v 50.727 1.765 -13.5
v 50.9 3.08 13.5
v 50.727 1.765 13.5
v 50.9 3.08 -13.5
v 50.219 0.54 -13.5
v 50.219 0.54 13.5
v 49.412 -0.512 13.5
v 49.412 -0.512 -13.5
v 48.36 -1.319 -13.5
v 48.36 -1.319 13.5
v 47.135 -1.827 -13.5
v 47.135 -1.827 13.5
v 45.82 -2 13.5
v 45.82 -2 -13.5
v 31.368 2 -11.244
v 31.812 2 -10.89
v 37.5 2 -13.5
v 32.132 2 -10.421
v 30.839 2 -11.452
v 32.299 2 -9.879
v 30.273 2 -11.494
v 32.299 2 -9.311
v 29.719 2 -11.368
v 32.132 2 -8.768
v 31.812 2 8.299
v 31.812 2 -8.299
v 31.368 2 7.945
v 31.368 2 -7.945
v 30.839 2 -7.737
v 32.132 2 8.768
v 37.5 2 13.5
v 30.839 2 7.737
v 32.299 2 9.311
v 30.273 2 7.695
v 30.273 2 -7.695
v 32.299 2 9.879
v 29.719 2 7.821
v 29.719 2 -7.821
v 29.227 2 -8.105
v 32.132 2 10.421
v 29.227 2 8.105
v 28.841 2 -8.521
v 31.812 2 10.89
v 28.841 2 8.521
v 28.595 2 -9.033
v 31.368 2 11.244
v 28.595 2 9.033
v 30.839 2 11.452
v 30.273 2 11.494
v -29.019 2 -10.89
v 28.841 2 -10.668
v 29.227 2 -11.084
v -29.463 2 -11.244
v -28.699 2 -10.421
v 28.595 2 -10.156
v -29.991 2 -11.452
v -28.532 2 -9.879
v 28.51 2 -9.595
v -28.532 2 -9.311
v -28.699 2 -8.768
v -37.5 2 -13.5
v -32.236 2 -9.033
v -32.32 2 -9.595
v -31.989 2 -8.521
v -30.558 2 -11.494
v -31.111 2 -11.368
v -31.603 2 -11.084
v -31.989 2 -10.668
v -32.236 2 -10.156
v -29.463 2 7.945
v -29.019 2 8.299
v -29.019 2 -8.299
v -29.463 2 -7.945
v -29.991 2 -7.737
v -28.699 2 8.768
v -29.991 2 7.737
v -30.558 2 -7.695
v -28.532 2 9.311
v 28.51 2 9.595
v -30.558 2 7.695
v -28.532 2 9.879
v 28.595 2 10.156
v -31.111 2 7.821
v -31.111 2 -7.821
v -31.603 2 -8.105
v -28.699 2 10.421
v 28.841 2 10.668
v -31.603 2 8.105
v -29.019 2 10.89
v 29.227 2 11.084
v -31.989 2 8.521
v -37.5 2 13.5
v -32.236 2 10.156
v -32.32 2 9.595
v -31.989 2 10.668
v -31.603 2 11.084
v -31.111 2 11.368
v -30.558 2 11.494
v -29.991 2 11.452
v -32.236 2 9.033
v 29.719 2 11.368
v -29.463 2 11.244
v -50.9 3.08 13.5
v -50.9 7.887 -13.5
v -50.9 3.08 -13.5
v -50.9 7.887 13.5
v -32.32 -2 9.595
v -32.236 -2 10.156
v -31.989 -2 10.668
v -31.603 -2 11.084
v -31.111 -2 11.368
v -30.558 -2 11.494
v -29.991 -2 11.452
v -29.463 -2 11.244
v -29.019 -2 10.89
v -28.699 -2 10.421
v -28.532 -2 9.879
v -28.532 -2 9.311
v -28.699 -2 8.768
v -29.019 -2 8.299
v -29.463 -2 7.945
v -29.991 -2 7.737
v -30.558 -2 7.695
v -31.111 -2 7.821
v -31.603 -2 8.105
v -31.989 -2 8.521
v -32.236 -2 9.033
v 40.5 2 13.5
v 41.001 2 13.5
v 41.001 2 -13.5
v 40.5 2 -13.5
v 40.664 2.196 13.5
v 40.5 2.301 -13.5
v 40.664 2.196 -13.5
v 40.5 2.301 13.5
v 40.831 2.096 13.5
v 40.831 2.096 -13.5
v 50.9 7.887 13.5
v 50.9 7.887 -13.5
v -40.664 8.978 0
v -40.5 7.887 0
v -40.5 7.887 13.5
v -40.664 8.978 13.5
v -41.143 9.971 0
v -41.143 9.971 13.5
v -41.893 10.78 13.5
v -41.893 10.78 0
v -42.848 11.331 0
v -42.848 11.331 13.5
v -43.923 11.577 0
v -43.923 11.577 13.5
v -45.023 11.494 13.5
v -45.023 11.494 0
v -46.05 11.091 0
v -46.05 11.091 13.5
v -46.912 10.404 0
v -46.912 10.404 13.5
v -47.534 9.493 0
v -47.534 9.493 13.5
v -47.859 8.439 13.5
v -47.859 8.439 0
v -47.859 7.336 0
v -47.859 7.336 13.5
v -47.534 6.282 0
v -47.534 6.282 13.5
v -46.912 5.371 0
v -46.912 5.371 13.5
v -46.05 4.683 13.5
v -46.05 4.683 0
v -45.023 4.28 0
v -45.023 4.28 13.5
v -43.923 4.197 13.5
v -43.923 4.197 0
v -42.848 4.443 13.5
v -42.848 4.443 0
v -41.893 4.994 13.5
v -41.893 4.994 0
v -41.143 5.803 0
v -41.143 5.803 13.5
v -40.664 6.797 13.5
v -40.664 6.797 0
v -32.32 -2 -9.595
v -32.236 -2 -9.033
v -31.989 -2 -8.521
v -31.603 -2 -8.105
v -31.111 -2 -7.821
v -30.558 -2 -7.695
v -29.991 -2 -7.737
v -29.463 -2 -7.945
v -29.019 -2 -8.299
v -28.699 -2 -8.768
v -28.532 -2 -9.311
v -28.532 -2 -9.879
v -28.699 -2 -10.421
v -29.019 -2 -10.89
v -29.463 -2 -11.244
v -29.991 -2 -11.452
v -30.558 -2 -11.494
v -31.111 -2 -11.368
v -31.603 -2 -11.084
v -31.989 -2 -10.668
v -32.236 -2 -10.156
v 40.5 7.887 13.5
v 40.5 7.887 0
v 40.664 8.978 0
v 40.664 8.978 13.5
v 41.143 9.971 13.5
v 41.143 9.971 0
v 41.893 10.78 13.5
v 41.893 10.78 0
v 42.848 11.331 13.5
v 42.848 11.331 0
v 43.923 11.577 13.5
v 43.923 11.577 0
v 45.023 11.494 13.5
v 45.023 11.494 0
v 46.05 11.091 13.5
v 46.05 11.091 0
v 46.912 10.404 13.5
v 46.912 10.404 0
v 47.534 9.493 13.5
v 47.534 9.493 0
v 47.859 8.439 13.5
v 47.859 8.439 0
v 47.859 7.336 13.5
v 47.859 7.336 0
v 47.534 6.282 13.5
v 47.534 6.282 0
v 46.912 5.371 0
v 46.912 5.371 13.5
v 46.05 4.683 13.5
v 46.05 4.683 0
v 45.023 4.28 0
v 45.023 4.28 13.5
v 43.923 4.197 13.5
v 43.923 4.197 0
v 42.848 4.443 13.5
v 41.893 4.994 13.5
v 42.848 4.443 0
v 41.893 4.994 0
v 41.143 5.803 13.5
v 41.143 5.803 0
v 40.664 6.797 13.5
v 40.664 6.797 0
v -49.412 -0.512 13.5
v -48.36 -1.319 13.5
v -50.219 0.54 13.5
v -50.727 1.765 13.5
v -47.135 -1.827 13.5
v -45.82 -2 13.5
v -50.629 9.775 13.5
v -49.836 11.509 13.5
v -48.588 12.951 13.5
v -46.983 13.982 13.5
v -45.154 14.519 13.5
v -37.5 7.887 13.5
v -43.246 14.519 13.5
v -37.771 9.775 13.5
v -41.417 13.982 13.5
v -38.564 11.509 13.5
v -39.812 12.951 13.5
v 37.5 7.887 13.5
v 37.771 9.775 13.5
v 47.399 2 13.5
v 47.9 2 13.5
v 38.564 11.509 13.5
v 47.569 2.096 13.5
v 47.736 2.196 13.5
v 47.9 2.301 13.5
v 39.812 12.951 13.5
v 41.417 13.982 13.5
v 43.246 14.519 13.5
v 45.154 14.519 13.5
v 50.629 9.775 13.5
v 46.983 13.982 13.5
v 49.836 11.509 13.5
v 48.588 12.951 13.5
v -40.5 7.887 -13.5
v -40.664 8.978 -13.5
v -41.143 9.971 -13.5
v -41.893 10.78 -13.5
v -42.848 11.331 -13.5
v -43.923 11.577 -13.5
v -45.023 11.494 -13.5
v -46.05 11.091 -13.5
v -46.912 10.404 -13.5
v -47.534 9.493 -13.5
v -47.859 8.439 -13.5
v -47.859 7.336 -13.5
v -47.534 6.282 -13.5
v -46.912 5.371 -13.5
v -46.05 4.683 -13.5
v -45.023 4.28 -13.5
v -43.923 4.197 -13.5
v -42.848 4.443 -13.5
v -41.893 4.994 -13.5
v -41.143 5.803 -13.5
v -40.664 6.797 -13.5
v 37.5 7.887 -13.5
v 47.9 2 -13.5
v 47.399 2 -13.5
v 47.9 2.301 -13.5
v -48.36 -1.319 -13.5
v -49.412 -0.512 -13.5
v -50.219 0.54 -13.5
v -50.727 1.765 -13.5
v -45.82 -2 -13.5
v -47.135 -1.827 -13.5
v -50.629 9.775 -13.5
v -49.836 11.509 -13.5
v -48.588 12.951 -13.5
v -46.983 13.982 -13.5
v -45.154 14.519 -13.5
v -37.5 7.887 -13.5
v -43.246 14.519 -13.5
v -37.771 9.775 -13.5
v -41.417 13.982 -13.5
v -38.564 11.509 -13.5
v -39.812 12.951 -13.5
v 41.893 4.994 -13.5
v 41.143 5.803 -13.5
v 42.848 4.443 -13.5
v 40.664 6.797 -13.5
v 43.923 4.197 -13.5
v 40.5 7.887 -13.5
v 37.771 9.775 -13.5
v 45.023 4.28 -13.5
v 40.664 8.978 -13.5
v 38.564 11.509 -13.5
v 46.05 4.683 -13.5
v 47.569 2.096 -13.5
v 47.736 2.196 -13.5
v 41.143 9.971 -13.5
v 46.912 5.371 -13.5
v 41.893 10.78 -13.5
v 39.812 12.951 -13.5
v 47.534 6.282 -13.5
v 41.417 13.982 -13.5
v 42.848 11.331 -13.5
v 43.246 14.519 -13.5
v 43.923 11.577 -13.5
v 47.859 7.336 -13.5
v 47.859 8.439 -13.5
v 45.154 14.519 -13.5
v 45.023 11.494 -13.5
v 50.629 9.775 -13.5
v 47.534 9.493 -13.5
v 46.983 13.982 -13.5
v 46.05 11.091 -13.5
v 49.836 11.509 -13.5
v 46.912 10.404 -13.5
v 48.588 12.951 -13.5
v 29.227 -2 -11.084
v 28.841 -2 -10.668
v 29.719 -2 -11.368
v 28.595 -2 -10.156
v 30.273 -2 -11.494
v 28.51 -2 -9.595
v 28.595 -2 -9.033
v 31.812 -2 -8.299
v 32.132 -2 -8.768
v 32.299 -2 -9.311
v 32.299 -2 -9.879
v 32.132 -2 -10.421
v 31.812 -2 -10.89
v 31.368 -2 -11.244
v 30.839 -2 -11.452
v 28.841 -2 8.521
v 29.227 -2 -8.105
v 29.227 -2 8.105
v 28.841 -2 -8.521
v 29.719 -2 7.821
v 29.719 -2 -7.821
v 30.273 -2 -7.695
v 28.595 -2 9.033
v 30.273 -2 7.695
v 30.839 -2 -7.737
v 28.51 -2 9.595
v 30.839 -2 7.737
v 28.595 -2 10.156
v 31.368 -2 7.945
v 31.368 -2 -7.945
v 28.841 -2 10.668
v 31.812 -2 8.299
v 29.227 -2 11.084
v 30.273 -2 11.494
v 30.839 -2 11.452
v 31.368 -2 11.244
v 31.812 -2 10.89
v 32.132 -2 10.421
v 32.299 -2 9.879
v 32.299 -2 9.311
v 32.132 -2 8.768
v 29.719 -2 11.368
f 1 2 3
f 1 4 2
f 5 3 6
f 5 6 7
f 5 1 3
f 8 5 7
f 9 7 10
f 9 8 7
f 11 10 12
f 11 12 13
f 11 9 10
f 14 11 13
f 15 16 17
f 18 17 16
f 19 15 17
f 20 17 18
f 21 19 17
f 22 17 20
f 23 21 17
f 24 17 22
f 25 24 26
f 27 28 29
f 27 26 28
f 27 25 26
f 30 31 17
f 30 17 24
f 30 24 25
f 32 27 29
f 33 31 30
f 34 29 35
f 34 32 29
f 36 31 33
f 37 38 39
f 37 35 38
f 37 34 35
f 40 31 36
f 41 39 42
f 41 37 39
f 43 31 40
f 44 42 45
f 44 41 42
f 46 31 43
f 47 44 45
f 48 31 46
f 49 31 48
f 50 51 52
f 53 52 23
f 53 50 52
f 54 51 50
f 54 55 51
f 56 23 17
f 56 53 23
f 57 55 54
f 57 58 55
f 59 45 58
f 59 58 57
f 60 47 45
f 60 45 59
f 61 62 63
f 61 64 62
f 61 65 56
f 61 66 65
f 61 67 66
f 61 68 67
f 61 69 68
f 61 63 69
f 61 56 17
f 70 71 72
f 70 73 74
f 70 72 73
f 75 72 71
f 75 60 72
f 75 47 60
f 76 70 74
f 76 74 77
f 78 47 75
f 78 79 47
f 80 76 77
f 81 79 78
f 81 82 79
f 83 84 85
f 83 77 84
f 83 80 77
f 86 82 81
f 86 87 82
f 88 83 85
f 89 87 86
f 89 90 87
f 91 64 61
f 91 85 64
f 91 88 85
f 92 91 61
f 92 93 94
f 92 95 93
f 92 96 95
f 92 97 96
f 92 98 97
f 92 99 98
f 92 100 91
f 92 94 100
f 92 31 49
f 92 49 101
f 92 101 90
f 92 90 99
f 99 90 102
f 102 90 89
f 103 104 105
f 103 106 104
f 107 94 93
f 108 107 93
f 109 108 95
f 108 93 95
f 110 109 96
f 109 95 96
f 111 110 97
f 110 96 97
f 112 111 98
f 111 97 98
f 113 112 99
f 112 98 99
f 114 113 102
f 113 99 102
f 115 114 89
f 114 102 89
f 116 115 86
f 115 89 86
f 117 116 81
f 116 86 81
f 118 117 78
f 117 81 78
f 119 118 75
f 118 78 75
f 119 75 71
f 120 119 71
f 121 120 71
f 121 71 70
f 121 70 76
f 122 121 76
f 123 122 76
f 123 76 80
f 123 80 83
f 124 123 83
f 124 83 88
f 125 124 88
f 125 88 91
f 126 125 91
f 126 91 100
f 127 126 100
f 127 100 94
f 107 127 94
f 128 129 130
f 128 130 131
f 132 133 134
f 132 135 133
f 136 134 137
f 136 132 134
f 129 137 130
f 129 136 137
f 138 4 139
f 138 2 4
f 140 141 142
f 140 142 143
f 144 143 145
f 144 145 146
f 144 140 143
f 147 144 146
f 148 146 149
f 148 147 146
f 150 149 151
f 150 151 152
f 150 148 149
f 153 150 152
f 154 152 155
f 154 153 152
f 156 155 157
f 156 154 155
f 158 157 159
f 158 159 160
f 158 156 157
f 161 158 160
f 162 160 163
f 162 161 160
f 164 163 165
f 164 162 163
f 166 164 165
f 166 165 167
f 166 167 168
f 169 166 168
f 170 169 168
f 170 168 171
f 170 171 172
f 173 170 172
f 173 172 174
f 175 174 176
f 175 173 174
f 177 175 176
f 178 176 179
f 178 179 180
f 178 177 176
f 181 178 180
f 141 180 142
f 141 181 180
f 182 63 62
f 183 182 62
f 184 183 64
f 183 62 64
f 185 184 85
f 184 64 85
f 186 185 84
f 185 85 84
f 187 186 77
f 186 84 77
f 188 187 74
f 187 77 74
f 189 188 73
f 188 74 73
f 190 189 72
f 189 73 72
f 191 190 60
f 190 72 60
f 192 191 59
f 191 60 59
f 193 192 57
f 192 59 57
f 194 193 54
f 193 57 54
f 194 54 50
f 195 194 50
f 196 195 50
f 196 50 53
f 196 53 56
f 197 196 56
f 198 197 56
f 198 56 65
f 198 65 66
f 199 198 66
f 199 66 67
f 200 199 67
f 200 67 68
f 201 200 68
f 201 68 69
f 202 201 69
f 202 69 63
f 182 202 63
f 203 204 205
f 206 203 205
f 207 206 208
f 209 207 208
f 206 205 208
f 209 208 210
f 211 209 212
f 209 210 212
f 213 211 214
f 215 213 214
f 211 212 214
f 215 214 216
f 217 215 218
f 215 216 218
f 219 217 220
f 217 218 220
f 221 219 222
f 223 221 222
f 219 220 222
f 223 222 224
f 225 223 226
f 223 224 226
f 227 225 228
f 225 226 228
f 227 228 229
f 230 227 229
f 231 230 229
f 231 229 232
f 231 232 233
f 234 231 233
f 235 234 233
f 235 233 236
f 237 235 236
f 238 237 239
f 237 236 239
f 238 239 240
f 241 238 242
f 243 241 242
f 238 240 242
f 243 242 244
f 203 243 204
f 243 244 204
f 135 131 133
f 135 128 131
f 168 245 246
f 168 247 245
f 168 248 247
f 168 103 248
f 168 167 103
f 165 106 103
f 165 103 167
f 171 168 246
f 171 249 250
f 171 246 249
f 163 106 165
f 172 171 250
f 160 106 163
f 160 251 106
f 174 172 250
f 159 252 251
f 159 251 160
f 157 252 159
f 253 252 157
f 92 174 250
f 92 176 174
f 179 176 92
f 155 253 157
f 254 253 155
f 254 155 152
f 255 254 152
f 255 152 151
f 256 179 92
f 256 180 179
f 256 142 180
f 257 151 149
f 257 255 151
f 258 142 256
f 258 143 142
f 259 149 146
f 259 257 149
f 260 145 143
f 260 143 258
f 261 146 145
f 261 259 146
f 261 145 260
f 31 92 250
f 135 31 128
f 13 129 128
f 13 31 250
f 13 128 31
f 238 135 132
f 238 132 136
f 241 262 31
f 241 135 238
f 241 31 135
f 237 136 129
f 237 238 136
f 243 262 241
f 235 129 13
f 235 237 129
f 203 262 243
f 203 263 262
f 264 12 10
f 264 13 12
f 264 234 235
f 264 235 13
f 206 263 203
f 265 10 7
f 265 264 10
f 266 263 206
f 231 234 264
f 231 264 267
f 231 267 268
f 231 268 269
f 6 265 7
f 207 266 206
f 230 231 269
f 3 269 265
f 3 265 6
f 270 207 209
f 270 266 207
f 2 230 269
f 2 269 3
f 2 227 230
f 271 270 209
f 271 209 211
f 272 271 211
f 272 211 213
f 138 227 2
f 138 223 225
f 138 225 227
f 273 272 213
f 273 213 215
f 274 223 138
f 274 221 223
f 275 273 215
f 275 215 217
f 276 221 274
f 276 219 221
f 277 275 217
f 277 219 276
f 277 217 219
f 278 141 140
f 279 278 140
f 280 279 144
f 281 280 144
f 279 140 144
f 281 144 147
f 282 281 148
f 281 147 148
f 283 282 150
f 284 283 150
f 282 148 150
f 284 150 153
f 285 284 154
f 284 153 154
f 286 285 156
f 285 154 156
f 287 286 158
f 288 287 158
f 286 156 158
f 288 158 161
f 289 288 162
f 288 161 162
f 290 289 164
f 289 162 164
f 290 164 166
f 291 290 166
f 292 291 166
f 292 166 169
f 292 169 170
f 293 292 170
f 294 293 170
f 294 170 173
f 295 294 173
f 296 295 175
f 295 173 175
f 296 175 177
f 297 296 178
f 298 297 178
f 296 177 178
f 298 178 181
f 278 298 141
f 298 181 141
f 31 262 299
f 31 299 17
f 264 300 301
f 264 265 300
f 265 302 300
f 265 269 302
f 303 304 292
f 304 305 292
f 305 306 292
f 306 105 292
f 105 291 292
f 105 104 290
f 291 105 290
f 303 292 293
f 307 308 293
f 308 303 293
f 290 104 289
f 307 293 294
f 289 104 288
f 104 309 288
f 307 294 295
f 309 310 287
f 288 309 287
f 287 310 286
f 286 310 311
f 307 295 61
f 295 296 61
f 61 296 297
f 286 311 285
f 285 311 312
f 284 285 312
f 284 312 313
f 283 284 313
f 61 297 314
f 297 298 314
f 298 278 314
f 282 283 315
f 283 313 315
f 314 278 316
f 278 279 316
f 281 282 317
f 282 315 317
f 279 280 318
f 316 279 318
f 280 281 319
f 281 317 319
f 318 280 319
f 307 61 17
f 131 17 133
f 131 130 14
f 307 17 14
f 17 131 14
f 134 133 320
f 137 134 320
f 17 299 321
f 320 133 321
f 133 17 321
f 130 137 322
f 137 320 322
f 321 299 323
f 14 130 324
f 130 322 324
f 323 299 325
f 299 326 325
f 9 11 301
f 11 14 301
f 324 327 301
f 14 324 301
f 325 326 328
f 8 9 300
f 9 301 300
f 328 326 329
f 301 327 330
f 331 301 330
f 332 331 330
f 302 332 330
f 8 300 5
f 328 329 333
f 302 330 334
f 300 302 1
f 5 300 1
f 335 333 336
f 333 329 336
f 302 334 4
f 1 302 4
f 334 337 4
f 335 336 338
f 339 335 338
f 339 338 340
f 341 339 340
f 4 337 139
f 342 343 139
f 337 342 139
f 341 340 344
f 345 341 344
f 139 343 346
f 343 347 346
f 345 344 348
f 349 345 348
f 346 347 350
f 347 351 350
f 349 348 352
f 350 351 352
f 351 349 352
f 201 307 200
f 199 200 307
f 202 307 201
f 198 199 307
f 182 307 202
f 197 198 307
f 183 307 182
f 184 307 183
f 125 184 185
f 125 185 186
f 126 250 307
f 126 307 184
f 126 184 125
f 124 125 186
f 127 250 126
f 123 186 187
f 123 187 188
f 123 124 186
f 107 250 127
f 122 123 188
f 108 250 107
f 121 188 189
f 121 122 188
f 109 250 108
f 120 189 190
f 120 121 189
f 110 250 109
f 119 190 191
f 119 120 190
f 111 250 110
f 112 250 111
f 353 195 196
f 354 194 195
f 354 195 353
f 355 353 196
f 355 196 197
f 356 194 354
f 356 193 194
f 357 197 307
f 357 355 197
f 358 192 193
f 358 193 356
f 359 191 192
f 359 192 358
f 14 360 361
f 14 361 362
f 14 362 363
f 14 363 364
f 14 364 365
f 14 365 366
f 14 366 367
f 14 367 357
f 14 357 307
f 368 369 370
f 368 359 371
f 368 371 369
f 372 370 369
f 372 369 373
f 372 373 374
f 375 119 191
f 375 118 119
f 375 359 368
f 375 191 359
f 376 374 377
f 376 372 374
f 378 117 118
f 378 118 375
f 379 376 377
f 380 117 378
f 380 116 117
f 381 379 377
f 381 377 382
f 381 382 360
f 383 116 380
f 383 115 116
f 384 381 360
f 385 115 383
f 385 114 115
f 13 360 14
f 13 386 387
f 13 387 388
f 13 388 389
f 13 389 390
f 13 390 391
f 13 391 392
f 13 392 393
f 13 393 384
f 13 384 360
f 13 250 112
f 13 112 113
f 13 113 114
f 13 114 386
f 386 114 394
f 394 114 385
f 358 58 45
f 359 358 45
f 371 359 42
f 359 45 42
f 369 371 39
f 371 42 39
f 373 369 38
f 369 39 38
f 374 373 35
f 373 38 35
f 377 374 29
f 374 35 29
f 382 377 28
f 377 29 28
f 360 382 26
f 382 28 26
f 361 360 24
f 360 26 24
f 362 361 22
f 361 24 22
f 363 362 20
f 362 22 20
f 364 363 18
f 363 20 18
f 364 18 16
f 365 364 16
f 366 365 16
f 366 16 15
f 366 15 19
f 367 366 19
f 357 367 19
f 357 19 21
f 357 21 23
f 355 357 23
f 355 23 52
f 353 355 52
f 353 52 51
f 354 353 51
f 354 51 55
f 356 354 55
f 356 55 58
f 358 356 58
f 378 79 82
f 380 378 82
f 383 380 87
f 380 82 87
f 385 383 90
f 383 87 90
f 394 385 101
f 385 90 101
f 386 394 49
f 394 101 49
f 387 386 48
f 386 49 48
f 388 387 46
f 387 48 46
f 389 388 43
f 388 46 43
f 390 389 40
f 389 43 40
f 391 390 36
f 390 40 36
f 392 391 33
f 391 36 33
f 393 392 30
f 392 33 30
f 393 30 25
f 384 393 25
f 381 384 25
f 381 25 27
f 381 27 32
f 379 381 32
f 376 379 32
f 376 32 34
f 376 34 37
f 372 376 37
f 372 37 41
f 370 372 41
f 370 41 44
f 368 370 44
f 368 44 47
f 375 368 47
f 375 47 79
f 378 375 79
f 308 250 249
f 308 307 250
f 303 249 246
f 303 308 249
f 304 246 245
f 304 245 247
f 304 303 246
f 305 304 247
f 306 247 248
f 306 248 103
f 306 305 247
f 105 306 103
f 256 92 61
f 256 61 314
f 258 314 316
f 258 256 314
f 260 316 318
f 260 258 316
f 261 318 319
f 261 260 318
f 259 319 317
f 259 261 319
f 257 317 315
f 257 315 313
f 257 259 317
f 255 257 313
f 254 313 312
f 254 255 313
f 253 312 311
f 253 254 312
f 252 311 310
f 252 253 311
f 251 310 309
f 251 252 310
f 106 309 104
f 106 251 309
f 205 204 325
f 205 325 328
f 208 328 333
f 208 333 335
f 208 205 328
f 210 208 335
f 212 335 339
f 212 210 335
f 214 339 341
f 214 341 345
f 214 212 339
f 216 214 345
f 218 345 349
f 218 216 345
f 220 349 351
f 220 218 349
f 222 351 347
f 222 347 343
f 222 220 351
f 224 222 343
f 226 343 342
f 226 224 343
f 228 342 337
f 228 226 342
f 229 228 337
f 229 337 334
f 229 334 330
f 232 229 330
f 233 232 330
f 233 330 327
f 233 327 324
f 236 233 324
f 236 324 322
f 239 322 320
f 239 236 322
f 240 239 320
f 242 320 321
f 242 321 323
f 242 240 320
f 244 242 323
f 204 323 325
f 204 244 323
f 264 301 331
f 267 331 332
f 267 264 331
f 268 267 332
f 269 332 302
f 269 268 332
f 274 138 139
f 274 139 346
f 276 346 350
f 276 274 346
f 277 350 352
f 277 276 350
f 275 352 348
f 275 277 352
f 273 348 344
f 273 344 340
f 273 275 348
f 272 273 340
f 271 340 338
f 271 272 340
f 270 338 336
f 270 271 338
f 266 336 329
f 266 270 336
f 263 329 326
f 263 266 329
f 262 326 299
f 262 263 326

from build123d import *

# Parameters (mm, degrees)
F0_R     = 3.7
F1_DEPTH = 13.5
F2_R     = 5.08
F4_D     = 3.81


with BuildPart() as f1:
    # F0 (on Top) → F1 (new body, symmetric)
    with BuildSketch(Plane.XY):
        with BuildLine():
            Line((47.9, 2.3014477862), (47.9, 7.887150161))
            ThreePointArc((47.9, 7.887150161), (44.2, 4.187150161), (40.5, 7.887150161))
            Line((40.5, 7.887150161), (40.5, 2.3014477862))
            ThreePointArc((40.5, 2.3014477862), (40.7473700627, 2.1452499933), (41.0013230857, 2))
            Line((41.0013230857, 2), (47.3986769143, 2))
            ThreePointArc((47.3986769143, 2), (47.6526299373, 2.1452499933), (47.9, 2.3014477862))
        make_face()
        with BuildLine():
            ThreePointArc((40.5, 7.887150161), (44.2, 11.587150161), (47.9, 7.887150161))
            Line((47.9, 7.887150161), (47.9, 2.3014477862))
            ThreePointArc((47.9, 2.3014477862), (50.1025456639, 4.7169726099), (50.9000053, 7.887150161))
            ThreePointArc((50.9000053, 7.887150161), (44.2, 14.587155461), (37.4999947, 7.887150161))
            ThreePointArc((37.4999947, 7.887150161), (38.2974543361, 4.7169726099), (40.5, 2.3014477862))
            Line((40.5, 2.3014477862), (40.5, 7.887150161))
        make_face()
        with BuildLine():
            ThreePointArc((50.9000053, 7.887150161), (50.1025456639, 4.7169726099), (47.9, 2.3014477862))
            Line((47.9, 2.3014477862), (47.9, 2))
            Line((47.9, 2), (47.9, -2))
            Line((47.9, -2), (50.9000053, -2))
            Line((50.9000053, -2), (50.9000053, 7.887150161))
        make_face()
        with BuildLine():
            Line((40.5, 2), (40.5, 2.3014477862))
            ThreePointArc((40.5, 2.3014477862), (38.2974543361, 4.7169726099), (37.4999947, 7.887150161))
            Line((37.4999947, 7.887150161), (37.4999947, 2))
            Line((37.4999947, 2), (40.5, 2))
        make_face()
        with BuildLine():
            Line((47.9, -2), (47.9, 2))
            Line((47.9, 2), (47.3986769143, 2))
            ThreePointArc((47.3986769143, 2), (44.2, 1.187144861), (41.0013230857, 2))
            Line((41.0013230857, 2), (40.5, 2))
            Line((40.5, 2), (37.4999947, 2))
            Line((37.4999947, 2), (0, 2))
            Line((0, 2), (0, -2))
            Line((0, -2), (47.9, -2))
        make_face()
        with BuildLine():
            ThreePointArc((41.0013230857, 2), (44.2, 1.187144861), (47.3986769143, 2))
            Line((47.3986769143, 2), (41.0013230857, 2))
        make_face()
        with BuildLine():
            Line((-47.9, -2), (0, -2))
            Line((0, -2), (0, 2))
            Line((0, 2), (-37.4999947, 2))
            Line((-37.4999947, 2), (-41.0013230857, 2))
            ThreePointArc((-41.0013230857, 2), (-44.2, 1.187144861), (-47.3986769143, 2))
            ThreePointArc((-47.3986769143, 2), (-49.958525128, 4.4623203301), (-50.9000053, 7.887150161))
            Line((-50.9000053, 7.887150161), (-50.9000053, -2))
            Line((-50.9000053, -2), (-47.9, -2))
        make_face()
        with BuildLine():
            Line((-41.0013230857, 2), (-37.4999947, 2))
            Line((-37.4999947, 2), (-37.4999947, 7.887150161))
            ThreePointArc((-37.4999947, 7.887150161), (-38.441474872, 4.4623203301), (-41.0013230857, 2))
        make_face()
        with BuildLine():
            ThreePointArc((-47.3986769143, 2), (-44.2, 1.187144861), (-41.0013230857, 2))
            Line((-41.0013230857, 2), (-47.3986769143, 2))
        make_face()
        with BuildLine():
            Line((-47.3986769143, 2), (-41.0013230857, 2))
            ThreePointArc((-41.0013230857, 2), (-38.441474872, 4.4623203301), (-37.4999947, 7.887150161))
            ThreePointArc((-37.4999947, 7.887150161), (-44.2, 14.587155461), (-50.9000053, 7.887150161))
            ThreePointArc((-50.9000053, 7.887150161), (-49.958525128, 4.4623203301), (-47.3986769143, 2))
        make_face()
        with Locations((-44.2, 7.887150161)):
            Circle(F0_R, mode=Mode.SUBTRACT)
    extrude(amount=F1_DEPTH, both=True)

    # F2
    f2_edges = [f1.edges().sort_by_distance(p)[0] for p in [
        (50.900005, -2, 0),
        (-50.900005, -2, 0),
    ]]
    fillet(f2_edges, radius=F2_R)

    # F4 (through all)
    with Locations(Plane.XZ.offset(2)):
        with Locations((-30.41523, 9.59459), (-30.41523, -9.59459), (30.41523, -9.59459), (30.41523, 9.59459)):
            Hole(F4_D / 2)


solid = f1.part
